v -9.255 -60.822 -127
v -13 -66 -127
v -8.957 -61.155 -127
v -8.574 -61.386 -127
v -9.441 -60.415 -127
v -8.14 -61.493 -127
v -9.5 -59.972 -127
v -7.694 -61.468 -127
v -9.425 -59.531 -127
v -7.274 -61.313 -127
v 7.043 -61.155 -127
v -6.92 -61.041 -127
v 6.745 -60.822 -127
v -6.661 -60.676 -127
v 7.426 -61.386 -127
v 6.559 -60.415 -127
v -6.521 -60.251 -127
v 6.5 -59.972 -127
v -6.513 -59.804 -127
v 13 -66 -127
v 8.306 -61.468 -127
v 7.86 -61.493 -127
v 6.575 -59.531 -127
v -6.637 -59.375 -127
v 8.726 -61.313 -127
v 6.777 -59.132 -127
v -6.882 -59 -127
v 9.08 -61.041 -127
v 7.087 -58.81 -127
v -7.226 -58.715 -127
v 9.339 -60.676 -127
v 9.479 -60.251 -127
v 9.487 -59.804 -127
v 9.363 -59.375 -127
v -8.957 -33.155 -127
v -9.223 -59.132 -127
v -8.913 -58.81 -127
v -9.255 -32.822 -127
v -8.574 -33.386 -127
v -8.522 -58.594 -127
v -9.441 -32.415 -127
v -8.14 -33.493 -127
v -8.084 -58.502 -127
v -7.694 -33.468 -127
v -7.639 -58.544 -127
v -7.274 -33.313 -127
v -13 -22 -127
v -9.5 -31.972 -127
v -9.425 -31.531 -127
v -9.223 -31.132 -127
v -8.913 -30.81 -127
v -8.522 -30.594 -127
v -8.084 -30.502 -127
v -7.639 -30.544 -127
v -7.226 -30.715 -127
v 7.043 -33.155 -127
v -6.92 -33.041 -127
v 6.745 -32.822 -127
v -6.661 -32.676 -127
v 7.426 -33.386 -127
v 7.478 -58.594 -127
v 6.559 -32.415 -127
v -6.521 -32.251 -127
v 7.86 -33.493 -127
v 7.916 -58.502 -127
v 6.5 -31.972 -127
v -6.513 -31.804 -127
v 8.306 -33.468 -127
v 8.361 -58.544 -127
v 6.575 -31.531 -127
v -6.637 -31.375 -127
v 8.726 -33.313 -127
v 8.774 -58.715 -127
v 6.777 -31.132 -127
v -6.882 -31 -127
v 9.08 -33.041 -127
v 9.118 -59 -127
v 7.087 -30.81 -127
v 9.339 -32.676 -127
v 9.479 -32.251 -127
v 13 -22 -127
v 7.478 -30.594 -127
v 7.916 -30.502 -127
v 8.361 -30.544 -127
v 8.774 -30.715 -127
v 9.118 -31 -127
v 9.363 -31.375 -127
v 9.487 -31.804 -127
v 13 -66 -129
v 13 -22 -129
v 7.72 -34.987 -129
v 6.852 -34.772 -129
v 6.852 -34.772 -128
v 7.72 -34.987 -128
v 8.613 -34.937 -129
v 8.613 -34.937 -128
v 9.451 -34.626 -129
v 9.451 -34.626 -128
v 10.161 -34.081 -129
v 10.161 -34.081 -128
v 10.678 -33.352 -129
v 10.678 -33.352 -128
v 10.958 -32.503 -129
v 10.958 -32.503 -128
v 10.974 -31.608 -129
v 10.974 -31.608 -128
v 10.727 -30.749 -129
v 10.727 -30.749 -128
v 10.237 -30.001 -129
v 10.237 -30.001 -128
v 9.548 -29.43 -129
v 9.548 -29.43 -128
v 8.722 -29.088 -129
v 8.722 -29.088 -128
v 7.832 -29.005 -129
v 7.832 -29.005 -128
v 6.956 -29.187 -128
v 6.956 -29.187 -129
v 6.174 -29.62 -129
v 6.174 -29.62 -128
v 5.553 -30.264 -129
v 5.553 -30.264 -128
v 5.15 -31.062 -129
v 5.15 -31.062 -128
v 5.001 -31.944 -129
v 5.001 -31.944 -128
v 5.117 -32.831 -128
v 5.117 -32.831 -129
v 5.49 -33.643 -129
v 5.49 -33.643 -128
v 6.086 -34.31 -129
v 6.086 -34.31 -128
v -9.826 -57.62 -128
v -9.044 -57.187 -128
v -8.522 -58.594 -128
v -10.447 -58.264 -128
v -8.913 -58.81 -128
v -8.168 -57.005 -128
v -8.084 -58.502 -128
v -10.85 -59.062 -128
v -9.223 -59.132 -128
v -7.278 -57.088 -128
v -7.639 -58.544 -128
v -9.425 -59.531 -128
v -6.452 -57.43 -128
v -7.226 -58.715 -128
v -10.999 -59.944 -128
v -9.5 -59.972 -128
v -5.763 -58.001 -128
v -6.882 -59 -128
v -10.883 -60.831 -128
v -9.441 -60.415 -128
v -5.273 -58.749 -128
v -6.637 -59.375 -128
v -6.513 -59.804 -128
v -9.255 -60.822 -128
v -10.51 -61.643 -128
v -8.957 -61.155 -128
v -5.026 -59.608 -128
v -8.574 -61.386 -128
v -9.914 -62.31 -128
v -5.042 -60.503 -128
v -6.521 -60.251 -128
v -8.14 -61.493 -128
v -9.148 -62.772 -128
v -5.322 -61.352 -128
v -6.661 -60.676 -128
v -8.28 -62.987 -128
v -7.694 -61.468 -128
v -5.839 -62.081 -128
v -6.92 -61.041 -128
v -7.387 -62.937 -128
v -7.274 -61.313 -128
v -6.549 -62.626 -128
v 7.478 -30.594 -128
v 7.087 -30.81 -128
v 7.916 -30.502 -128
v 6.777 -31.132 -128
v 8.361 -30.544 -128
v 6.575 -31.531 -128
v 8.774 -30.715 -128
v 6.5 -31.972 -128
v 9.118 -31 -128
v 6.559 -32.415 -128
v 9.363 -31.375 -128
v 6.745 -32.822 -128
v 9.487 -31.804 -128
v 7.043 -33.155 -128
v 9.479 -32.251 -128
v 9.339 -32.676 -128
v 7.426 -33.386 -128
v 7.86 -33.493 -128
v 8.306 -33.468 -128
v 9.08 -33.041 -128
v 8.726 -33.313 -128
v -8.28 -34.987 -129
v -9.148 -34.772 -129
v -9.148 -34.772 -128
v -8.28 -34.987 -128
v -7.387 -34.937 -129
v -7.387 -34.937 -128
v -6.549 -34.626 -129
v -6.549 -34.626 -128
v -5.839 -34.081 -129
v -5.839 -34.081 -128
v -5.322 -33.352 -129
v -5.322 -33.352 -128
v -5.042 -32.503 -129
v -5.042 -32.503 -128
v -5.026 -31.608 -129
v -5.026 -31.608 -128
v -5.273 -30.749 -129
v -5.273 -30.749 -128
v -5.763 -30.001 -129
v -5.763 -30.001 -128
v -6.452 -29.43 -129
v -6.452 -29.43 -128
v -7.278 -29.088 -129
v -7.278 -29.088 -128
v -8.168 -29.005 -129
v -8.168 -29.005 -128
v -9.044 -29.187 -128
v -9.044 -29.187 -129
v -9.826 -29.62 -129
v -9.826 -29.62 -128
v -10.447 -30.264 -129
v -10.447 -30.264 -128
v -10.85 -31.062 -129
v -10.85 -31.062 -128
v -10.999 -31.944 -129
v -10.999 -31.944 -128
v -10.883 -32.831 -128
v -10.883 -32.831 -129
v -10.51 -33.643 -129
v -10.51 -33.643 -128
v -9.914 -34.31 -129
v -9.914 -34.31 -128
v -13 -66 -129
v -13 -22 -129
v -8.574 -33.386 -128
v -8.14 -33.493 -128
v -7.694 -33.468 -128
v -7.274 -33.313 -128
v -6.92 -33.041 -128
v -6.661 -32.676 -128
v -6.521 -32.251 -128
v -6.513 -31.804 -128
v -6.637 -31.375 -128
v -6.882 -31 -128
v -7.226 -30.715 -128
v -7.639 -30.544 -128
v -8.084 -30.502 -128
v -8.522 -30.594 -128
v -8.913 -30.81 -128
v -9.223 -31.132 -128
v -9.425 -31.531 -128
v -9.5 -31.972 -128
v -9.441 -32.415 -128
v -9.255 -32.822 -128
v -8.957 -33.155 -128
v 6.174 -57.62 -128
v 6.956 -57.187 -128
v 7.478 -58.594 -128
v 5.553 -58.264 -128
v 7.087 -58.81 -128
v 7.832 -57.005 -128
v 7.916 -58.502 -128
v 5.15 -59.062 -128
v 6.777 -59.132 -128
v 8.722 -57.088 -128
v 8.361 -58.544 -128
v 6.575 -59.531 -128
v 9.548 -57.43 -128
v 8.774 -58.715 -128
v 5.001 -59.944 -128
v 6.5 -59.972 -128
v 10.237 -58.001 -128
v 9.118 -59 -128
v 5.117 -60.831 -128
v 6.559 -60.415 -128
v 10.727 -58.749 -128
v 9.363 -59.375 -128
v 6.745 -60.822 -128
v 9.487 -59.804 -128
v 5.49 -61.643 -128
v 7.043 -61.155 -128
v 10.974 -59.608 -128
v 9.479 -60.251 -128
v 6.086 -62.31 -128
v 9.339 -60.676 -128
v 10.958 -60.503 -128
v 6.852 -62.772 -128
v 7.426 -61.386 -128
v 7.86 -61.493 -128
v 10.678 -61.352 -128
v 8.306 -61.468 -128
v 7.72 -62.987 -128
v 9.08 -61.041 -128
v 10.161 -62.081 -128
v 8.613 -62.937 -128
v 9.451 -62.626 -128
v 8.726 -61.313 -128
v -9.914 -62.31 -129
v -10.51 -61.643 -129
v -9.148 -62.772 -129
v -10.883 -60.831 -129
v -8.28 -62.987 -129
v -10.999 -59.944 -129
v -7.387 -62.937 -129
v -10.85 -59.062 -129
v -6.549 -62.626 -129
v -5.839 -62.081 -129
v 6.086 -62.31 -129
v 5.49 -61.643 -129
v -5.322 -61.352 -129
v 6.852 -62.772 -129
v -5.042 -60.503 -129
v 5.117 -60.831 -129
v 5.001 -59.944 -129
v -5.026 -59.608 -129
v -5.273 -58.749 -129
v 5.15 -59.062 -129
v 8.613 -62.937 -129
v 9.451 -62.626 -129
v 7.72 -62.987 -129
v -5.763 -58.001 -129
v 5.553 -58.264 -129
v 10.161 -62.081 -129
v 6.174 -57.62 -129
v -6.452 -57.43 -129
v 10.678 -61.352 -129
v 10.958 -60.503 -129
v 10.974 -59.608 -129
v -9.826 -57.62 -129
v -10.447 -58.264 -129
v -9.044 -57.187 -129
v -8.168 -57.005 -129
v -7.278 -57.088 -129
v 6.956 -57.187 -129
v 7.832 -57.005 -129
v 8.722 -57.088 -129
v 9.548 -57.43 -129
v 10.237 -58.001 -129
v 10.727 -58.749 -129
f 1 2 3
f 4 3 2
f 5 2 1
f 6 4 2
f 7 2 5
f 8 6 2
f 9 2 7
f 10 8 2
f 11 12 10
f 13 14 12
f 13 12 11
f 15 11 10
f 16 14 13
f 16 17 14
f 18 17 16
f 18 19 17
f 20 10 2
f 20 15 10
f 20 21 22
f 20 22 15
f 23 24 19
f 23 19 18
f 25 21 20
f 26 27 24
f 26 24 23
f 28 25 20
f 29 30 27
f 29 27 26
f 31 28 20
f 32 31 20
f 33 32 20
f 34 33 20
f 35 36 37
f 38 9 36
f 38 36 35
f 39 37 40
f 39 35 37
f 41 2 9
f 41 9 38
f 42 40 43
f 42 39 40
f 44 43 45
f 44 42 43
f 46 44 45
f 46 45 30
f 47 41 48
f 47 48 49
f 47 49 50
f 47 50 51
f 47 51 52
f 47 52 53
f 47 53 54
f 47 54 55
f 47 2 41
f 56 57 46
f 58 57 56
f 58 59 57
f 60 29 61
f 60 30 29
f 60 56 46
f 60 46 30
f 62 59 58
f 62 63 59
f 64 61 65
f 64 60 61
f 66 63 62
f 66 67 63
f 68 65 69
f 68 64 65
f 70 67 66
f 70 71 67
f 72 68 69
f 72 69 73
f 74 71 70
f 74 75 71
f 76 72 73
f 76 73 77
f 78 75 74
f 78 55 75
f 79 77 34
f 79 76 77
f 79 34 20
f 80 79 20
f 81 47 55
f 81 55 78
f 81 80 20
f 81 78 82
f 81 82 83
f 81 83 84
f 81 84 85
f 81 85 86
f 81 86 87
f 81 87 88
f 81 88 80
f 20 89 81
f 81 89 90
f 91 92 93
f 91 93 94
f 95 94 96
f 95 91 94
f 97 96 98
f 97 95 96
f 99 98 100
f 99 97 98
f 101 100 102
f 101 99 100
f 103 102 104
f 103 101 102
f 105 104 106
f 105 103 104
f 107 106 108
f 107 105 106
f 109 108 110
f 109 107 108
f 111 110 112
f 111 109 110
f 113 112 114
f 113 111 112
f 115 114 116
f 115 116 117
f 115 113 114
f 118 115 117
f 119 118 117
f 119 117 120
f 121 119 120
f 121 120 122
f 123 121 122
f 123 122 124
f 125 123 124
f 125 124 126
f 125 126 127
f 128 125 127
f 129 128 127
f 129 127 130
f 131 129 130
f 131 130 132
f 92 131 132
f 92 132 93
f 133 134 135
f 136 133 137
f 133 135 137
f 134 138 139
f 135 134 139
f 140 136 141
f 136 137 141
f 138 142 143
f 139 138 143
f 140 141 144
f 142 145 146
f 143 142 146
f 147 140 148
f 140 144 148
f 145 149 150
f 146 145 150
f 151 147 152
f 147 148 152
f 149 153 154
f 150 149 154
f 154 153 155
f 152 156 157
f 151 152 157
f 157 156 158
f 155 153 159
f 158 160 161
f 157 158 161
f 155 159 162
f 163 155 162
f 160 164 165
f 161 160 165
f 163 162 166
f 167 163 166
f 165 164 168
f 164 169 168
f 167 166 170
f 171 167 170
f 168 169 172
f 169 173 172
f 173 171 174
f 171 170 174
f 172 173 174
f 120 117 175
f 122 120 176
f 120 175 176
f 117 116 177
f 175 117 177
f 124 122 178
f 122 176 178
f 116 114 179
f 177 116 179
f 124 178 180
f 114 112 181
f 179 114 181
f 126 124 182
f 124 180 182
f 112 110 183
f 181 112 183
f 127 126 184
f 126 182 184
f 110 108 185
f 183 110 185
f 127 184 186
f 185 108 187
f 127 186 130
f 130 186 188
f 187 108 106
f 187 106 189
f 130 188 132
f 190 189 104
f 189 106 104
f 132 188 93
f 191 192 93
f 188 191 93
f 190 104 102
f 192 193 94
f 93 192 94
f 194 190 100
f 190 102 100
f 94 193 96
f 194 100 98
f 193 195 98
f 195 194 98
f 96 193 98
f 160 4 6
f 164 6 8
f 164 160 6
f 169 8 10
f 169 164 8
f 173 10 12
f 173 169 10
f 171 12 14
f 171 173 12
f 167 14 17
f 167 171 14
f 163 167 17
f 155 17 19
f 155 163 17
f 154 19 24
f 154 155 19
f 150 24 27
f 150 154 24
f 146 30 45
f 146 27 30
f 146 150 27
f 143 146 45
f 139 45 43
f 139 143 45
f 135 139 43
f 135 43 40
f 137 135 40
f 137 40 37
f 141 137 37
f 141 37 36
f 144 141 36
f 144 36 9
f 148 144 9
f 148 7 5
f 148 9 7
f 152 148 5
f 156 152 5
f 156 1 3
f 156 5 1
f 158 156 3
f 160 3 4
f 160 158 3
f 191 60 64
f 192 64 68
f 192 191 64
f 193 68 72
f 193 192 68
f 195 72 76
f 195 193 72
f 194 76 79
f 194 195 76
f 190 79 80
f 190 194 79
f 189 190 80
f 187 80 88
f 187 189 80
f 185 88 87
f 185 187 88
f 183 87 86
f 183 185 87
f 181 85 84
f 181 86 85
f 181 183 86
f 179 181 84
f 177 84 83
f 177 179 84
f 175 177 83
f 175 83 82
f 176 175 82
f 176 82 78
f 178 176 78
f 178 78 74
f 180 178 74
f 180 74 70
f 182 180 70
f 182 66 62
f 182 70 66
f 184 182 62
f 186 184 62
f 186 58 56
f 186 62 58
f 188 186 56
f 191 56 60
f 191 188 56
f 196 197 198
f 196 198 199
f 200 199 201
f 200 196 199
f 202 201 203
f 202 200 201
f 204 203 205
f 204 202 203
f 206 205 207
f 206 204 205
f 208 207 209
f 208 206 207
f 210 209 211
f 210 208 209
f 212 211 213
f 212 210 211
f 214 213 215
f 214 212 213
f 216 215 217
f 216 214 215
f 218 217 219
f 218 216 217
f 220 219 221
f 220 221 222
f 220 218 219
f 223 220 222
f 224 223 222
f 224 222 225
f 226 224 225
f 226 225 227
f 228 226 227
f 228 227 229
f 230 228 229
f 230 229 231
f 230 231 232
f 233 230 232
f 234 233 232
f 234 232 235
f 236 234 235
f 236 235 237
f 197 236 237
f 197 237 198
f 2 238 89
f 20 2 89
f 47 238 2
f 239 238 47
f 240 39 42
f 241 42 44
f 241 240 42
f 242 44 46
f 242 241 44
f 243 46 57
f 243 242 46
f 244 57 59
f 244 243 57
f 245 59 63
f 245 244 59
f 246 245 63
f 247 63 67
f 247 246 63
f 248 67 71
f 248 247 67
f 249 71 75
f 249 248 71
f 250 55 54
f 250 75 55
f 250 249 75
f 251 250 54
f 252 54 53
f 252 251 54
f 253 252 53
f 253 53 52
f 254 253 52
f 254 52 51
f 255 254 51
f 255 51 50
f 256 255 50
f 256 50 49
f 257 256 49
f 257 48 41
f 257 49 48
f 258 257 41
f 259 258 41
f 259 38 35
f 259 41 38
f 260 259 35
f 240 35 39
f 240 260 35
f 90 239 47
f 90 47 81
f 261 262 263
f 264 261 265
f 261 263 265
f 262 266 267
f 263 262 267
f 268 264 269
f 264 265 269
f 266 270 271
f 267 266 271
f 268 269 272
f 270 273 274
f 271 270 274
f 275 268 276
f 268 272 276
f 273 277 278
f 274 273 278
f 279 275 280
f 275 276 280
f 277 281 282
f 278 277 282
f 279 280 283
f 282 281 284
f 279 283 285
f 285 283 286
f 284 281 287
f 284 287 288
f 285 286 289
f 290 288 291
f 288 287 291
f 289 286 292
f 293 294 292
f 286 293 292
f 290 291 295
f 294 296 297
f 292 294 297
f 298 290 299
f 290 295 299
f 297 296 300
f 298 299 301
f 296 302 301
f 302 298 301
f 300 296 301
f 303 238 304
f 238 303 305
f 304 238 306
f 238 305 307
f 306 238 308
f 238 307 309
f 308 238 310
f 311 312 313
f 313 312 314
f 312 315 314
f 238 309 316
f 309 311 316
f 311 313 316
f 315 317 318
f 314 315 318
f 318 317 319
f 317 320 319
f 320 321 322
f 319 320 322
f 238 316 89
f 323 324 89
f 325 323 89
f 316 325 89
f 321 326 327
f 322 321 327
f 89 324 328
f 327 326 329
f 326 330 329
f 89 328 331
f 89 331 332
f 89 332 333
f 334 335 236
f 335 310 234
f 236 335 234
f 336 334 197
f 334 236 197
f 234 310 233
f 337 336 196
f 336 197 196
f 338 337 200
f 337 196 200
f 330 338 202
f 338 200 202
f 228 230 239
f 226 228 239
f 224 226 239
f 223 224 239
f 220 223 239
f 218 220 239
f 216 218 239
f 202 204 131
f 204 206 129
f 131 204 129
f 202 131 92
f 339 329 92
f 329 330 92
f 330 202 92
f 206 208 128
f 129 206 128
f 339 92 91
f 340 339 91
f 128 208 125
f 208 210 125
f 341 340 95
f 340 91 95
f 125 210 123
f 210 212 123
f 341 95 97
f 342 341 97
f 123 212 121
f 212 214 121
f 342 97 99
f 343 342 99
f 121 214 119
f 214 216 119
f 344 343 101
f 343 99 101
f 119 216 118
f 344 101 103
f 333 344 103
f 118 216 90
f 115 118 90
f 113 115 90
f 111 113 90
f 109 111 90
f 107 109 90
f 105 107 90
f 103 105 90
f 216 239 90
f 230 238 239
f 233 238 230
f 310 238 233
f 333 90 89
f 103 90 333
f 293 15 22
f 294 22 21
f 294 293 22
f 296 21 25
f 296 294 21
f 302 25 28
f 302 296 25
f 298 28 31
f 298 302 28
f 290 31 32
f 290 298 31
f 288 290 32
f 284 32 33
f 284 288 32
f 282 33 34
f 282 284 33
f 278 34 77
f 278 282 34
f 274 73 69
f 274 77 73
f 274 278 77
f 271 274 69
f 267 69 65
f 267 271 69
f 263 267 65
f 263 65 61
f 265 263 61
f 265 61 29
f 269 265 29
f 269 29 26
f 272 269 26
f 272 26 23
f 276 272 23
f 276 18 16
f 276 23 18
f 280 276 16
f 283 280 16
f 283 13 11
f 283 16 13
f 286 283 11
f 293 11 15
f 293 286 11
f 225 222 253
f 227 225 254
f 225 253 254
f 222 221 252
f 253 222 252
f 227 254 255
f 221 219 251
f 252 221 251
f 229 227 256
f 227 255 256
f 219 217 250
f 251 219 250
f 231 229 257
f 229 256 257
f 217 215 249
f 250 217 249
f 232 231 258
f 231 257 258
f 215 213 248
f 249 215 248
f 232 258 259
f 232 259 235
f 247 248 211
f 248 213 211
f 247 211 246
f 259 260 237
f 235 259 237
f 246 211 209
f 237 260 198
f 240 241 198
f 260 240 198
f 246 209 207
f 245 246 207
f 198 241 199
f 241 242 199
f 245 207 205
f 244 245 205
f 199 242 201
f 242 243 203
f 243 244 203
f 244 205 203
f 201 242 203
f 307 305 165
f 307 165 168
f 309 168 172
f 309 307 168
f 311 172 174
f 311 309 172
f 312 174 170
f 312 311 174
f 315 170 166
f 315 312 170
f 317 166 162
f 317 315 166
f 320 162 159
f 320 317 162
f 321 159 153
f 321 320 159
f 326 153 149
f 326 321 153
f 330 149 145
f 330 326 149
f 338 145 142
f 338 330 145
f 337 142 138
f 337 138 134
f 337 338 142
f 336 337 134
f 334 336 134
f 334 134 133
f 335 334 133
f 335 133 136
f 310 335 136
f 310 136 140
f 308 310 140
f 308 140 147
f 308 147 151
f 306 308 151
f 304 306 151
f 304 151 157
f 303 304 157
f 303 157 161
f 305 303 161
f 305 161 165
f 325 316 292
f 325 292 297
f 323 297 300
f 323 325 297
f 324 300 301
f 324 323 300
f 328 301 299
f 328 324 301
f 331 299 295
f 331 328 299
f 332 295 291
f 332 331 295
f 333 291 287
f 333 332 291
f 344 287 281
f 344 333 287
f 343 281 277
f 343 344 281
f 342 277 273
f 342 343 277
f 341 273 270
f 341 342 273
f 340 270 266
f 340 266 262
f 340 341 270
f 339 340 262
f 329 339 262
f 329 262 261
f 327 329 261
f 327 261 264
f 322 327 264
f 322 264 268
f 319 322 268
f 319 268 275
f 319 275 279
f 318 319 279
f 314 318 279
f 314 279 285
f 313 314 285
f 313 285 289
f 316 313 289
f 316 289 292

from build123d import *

# Parameters (mm, degrees)
CYLINDER1890_R               = 1.5
CYLINDER1890_DEPTH           = 20
CYLINDER1890_PLACEMENT_ANGLE = -112.5
CYLINDER1891_R               = 1.5
CYLINDER1891_DEPTH           = 20
CYLINDER1891_PLACEMENT_ANGLE = 112.5
CYLINDER1892_R               = 1.5
CYLINDER1892_DEPTH           = 20
CYLINDER1892_PLACEMENT_ANGLE = 112.5
CYLINDER1893_R               = 1.5
CYLINDER1893_DEPTH           = 20
CYLINDER1893_PLACEMENT_ANGLE = -112.5
CYLINDER1885_R               = 3
CYLINDER1885_DEPTH           = 3
CYLINDER1885_PLACEMENT_ANGLE = -112.5
CYLINDER1894_R               = 3
CYLINDER1894_DEPTH           = 3
CYLINDER1894_PLACEMENT_ANGLE = 112.5
CYLINDER1895_R               = 3
CYLINDER1895_DEPTH           = 3
CYLINDER1895_PLACEMENT_ANGLE = 112.5
CYLINDER1884_R               = 3
CYLINDER1884_DEPTH           = 3
CYLINDER1884_PLACEMENT_ANGLE = -112.5
BOX748_W                     = 26
BOX748_H                     = 44
BOX748_DEPTH                 = 2


with BuildPart() as v_lec1890:
    # Cylinder1890 → Cylinder1890 (new body)
    with BuildSketch(Plane.XY):
        Circle(CYLINDER1890_R)
    extrude(amount=CYLINDER1890_DEPTH)


with BuildPart() as v_lec1890_1:
    # Cylinder1890 placement: moved
    add(v_lec1890.part.moved(Location((-8, 34, 51))).rotate(Axis((-8, 34, 51), (0, 0, 1)), CYLINDER1890_PLACEMENT_ANGLE))


with BuildPart() as v_lec1891:
    # Cylinder1891 → Cylinder1891 (new body)
    with BuildSketch(Plane.XY):
        Circle(CYLINDER1891_R)
    extrude(amount=CYLINDER1891_DEPTH)


with BuildPart() as v_lec1891_1:
    # Cylinder1891 placement: moved
    add(v_lec1891.part.moved(Location((8, 62, 51))).rotate(Axis((8, 62, 51), (0, 0, -1)), CYLINDER1891_PLACEMENT_ANGLE))


with BuildPart() as v_lec1892:
    # Cylinder1892 → Cylinder1892 (new body)
    with BuildSketch(Plane.XY):
        Circle(CYLINDER1892_R)
    extrude(amount=CYLINDER1892_DEPTH)


with BuildPart() as v_lec1892_1:
    # Cylinder1892 placement: moved
    add(v_lec1892.part.moved(Location((-8, 62, 51))).rotate(Axis((-8, 62, 51), (0, 0, -1)), CYLINDER1892_PLACEMENT_ANGLE))


with BuildPart() as compound848:
    # Cylinder1893 → Cylinder1893 (new body)
    with BuildSketch(Plane.XY):
        Circle(CYLINDER1893_R)
    extrude(amount=CYLINDER1893_DEPTH)


with BuildPart() as compound848_1:
    # Cylinder1893 placement: moved
    add(compound848.part.moved(Location((8, 34, 51))).rotate(Axis((8, 34, 51), (0, 0, 1)), CYLINDER1893_PLACEMENT_ANGLE))

    # Compound848: union Válec1890, Válec1891, Válec1892
    add(v_lec1890_1.part)
    add(v_lec1891_1.part)
    add(v_lec1892_1.part)


with BuildPart() as compound848_2:
    # Compound848 placement: moved
    add(compound848_1.part.moved(Location((0, -94, -180))))


with BuildPart() as v_lec1885:
    # Cylinder1885 → Cylinder1885 (new body)
    with BuildSketch(Plane.XY):
        Circle(CYLINDER1885_R)
    extrude(amount=CYLINDER1885_DEPTH)


with BuildPart() as v_lec1885_1:
    # Cylinder1885 placement: moved
    add(v_lec1885.part.moved(Location((-8, 34, 51))).rotate(Axis((-8, 34, 51), (0, 0, 1)), CYLINDER1885_PLACEMENT_ANGLE))


with BuildPart() as v_lec1894:
    # Cylinder1894 → Cylinder1894 (new body)
    with BuildSketch(Plane.XY):
        Circle(CYLINDER1894_R)
    extrude(amount=CYLINDER1894_DEPTH)


with BuildPart() as v_lec1894_1:
    # Cylinder1894 placement: moved
    add(v_lec1894.part.moved(Location((8, 62, 51))).rotate(Axis((8, 62, 51), (0, 0, -1)), CYLINDER1894_PLACEMENT_ANGLE))


with BuildPart() as v_lec1895:
    # Cylinder1895 → Cylinder1895 (new body)
    with BuildSketch(Plane.XY):
        Circle(CYLINDER1895_R)
    extrude(amount=CYLINDER1895_DEPTH)


with BuildPart() as v_lec1895_1:
    # Cylinder1895 placement: moved
    add(v_lec1895.part.moved(Location((-8, 62, 51))).rotate(Axis((-8, 62, 51), (0, 0, -1)), CYLINDER1895_PLACEMENT_ANGLE))


with BuildPart() as compound847:
    # Cylinder1884 → Cylinder1884 (new body)
    with BuildSketch(Plane.XY):
        Circle(CYLINDER1884_R)
    extrude(amount=CYLINDER1884_DEPTH)


with BuildPart() as compound847_1:
    # Cylinder1884 placement: moved
    add(compound847.part.moved(Location((8, 34, 51))).rotate(Axis((8, 34, 51), (0, 0, 1)), CYLINDER1884_PLACEMENT_ANGLE))

    # Compound847: union Válec1885, Válec1894, Válec1895
    add(v_lec1885_1.part)
    add(v_lec1894_1.part)
    add(v_lec1895_1.part)


with BuildPart() as compound847_2:
    # Compound847 placement: moved
    add(compound847_1.part.moved(Location((0, -94, -183))))


with BuildPart() as cut687:
    # Box748 → Box748 (new body)
    with BuildSketch(Plane(origin=(-13, -66, -130), x_dir=(1, 0, 0), z_dir=(0, 0, 1))):
        with Locations((13, 22)):
            Rectangle(BOX748_W, BOX748_H)
    extrude(amount=BOX748_DEPTH)

    # Cut686: cut Compound847
    add(compound847_2.part, mode=Mode.SUBTRACT)

    # Cut687: cut Compound848
    add(compound848_2.part, mode=Mode.SUBTRACT)


with BuildPart() as cut687_1:
    # Cut687 placement: moved
    add(cut687.part.moved(Location((0, 0, 1))))


solid = cut687_1.part
